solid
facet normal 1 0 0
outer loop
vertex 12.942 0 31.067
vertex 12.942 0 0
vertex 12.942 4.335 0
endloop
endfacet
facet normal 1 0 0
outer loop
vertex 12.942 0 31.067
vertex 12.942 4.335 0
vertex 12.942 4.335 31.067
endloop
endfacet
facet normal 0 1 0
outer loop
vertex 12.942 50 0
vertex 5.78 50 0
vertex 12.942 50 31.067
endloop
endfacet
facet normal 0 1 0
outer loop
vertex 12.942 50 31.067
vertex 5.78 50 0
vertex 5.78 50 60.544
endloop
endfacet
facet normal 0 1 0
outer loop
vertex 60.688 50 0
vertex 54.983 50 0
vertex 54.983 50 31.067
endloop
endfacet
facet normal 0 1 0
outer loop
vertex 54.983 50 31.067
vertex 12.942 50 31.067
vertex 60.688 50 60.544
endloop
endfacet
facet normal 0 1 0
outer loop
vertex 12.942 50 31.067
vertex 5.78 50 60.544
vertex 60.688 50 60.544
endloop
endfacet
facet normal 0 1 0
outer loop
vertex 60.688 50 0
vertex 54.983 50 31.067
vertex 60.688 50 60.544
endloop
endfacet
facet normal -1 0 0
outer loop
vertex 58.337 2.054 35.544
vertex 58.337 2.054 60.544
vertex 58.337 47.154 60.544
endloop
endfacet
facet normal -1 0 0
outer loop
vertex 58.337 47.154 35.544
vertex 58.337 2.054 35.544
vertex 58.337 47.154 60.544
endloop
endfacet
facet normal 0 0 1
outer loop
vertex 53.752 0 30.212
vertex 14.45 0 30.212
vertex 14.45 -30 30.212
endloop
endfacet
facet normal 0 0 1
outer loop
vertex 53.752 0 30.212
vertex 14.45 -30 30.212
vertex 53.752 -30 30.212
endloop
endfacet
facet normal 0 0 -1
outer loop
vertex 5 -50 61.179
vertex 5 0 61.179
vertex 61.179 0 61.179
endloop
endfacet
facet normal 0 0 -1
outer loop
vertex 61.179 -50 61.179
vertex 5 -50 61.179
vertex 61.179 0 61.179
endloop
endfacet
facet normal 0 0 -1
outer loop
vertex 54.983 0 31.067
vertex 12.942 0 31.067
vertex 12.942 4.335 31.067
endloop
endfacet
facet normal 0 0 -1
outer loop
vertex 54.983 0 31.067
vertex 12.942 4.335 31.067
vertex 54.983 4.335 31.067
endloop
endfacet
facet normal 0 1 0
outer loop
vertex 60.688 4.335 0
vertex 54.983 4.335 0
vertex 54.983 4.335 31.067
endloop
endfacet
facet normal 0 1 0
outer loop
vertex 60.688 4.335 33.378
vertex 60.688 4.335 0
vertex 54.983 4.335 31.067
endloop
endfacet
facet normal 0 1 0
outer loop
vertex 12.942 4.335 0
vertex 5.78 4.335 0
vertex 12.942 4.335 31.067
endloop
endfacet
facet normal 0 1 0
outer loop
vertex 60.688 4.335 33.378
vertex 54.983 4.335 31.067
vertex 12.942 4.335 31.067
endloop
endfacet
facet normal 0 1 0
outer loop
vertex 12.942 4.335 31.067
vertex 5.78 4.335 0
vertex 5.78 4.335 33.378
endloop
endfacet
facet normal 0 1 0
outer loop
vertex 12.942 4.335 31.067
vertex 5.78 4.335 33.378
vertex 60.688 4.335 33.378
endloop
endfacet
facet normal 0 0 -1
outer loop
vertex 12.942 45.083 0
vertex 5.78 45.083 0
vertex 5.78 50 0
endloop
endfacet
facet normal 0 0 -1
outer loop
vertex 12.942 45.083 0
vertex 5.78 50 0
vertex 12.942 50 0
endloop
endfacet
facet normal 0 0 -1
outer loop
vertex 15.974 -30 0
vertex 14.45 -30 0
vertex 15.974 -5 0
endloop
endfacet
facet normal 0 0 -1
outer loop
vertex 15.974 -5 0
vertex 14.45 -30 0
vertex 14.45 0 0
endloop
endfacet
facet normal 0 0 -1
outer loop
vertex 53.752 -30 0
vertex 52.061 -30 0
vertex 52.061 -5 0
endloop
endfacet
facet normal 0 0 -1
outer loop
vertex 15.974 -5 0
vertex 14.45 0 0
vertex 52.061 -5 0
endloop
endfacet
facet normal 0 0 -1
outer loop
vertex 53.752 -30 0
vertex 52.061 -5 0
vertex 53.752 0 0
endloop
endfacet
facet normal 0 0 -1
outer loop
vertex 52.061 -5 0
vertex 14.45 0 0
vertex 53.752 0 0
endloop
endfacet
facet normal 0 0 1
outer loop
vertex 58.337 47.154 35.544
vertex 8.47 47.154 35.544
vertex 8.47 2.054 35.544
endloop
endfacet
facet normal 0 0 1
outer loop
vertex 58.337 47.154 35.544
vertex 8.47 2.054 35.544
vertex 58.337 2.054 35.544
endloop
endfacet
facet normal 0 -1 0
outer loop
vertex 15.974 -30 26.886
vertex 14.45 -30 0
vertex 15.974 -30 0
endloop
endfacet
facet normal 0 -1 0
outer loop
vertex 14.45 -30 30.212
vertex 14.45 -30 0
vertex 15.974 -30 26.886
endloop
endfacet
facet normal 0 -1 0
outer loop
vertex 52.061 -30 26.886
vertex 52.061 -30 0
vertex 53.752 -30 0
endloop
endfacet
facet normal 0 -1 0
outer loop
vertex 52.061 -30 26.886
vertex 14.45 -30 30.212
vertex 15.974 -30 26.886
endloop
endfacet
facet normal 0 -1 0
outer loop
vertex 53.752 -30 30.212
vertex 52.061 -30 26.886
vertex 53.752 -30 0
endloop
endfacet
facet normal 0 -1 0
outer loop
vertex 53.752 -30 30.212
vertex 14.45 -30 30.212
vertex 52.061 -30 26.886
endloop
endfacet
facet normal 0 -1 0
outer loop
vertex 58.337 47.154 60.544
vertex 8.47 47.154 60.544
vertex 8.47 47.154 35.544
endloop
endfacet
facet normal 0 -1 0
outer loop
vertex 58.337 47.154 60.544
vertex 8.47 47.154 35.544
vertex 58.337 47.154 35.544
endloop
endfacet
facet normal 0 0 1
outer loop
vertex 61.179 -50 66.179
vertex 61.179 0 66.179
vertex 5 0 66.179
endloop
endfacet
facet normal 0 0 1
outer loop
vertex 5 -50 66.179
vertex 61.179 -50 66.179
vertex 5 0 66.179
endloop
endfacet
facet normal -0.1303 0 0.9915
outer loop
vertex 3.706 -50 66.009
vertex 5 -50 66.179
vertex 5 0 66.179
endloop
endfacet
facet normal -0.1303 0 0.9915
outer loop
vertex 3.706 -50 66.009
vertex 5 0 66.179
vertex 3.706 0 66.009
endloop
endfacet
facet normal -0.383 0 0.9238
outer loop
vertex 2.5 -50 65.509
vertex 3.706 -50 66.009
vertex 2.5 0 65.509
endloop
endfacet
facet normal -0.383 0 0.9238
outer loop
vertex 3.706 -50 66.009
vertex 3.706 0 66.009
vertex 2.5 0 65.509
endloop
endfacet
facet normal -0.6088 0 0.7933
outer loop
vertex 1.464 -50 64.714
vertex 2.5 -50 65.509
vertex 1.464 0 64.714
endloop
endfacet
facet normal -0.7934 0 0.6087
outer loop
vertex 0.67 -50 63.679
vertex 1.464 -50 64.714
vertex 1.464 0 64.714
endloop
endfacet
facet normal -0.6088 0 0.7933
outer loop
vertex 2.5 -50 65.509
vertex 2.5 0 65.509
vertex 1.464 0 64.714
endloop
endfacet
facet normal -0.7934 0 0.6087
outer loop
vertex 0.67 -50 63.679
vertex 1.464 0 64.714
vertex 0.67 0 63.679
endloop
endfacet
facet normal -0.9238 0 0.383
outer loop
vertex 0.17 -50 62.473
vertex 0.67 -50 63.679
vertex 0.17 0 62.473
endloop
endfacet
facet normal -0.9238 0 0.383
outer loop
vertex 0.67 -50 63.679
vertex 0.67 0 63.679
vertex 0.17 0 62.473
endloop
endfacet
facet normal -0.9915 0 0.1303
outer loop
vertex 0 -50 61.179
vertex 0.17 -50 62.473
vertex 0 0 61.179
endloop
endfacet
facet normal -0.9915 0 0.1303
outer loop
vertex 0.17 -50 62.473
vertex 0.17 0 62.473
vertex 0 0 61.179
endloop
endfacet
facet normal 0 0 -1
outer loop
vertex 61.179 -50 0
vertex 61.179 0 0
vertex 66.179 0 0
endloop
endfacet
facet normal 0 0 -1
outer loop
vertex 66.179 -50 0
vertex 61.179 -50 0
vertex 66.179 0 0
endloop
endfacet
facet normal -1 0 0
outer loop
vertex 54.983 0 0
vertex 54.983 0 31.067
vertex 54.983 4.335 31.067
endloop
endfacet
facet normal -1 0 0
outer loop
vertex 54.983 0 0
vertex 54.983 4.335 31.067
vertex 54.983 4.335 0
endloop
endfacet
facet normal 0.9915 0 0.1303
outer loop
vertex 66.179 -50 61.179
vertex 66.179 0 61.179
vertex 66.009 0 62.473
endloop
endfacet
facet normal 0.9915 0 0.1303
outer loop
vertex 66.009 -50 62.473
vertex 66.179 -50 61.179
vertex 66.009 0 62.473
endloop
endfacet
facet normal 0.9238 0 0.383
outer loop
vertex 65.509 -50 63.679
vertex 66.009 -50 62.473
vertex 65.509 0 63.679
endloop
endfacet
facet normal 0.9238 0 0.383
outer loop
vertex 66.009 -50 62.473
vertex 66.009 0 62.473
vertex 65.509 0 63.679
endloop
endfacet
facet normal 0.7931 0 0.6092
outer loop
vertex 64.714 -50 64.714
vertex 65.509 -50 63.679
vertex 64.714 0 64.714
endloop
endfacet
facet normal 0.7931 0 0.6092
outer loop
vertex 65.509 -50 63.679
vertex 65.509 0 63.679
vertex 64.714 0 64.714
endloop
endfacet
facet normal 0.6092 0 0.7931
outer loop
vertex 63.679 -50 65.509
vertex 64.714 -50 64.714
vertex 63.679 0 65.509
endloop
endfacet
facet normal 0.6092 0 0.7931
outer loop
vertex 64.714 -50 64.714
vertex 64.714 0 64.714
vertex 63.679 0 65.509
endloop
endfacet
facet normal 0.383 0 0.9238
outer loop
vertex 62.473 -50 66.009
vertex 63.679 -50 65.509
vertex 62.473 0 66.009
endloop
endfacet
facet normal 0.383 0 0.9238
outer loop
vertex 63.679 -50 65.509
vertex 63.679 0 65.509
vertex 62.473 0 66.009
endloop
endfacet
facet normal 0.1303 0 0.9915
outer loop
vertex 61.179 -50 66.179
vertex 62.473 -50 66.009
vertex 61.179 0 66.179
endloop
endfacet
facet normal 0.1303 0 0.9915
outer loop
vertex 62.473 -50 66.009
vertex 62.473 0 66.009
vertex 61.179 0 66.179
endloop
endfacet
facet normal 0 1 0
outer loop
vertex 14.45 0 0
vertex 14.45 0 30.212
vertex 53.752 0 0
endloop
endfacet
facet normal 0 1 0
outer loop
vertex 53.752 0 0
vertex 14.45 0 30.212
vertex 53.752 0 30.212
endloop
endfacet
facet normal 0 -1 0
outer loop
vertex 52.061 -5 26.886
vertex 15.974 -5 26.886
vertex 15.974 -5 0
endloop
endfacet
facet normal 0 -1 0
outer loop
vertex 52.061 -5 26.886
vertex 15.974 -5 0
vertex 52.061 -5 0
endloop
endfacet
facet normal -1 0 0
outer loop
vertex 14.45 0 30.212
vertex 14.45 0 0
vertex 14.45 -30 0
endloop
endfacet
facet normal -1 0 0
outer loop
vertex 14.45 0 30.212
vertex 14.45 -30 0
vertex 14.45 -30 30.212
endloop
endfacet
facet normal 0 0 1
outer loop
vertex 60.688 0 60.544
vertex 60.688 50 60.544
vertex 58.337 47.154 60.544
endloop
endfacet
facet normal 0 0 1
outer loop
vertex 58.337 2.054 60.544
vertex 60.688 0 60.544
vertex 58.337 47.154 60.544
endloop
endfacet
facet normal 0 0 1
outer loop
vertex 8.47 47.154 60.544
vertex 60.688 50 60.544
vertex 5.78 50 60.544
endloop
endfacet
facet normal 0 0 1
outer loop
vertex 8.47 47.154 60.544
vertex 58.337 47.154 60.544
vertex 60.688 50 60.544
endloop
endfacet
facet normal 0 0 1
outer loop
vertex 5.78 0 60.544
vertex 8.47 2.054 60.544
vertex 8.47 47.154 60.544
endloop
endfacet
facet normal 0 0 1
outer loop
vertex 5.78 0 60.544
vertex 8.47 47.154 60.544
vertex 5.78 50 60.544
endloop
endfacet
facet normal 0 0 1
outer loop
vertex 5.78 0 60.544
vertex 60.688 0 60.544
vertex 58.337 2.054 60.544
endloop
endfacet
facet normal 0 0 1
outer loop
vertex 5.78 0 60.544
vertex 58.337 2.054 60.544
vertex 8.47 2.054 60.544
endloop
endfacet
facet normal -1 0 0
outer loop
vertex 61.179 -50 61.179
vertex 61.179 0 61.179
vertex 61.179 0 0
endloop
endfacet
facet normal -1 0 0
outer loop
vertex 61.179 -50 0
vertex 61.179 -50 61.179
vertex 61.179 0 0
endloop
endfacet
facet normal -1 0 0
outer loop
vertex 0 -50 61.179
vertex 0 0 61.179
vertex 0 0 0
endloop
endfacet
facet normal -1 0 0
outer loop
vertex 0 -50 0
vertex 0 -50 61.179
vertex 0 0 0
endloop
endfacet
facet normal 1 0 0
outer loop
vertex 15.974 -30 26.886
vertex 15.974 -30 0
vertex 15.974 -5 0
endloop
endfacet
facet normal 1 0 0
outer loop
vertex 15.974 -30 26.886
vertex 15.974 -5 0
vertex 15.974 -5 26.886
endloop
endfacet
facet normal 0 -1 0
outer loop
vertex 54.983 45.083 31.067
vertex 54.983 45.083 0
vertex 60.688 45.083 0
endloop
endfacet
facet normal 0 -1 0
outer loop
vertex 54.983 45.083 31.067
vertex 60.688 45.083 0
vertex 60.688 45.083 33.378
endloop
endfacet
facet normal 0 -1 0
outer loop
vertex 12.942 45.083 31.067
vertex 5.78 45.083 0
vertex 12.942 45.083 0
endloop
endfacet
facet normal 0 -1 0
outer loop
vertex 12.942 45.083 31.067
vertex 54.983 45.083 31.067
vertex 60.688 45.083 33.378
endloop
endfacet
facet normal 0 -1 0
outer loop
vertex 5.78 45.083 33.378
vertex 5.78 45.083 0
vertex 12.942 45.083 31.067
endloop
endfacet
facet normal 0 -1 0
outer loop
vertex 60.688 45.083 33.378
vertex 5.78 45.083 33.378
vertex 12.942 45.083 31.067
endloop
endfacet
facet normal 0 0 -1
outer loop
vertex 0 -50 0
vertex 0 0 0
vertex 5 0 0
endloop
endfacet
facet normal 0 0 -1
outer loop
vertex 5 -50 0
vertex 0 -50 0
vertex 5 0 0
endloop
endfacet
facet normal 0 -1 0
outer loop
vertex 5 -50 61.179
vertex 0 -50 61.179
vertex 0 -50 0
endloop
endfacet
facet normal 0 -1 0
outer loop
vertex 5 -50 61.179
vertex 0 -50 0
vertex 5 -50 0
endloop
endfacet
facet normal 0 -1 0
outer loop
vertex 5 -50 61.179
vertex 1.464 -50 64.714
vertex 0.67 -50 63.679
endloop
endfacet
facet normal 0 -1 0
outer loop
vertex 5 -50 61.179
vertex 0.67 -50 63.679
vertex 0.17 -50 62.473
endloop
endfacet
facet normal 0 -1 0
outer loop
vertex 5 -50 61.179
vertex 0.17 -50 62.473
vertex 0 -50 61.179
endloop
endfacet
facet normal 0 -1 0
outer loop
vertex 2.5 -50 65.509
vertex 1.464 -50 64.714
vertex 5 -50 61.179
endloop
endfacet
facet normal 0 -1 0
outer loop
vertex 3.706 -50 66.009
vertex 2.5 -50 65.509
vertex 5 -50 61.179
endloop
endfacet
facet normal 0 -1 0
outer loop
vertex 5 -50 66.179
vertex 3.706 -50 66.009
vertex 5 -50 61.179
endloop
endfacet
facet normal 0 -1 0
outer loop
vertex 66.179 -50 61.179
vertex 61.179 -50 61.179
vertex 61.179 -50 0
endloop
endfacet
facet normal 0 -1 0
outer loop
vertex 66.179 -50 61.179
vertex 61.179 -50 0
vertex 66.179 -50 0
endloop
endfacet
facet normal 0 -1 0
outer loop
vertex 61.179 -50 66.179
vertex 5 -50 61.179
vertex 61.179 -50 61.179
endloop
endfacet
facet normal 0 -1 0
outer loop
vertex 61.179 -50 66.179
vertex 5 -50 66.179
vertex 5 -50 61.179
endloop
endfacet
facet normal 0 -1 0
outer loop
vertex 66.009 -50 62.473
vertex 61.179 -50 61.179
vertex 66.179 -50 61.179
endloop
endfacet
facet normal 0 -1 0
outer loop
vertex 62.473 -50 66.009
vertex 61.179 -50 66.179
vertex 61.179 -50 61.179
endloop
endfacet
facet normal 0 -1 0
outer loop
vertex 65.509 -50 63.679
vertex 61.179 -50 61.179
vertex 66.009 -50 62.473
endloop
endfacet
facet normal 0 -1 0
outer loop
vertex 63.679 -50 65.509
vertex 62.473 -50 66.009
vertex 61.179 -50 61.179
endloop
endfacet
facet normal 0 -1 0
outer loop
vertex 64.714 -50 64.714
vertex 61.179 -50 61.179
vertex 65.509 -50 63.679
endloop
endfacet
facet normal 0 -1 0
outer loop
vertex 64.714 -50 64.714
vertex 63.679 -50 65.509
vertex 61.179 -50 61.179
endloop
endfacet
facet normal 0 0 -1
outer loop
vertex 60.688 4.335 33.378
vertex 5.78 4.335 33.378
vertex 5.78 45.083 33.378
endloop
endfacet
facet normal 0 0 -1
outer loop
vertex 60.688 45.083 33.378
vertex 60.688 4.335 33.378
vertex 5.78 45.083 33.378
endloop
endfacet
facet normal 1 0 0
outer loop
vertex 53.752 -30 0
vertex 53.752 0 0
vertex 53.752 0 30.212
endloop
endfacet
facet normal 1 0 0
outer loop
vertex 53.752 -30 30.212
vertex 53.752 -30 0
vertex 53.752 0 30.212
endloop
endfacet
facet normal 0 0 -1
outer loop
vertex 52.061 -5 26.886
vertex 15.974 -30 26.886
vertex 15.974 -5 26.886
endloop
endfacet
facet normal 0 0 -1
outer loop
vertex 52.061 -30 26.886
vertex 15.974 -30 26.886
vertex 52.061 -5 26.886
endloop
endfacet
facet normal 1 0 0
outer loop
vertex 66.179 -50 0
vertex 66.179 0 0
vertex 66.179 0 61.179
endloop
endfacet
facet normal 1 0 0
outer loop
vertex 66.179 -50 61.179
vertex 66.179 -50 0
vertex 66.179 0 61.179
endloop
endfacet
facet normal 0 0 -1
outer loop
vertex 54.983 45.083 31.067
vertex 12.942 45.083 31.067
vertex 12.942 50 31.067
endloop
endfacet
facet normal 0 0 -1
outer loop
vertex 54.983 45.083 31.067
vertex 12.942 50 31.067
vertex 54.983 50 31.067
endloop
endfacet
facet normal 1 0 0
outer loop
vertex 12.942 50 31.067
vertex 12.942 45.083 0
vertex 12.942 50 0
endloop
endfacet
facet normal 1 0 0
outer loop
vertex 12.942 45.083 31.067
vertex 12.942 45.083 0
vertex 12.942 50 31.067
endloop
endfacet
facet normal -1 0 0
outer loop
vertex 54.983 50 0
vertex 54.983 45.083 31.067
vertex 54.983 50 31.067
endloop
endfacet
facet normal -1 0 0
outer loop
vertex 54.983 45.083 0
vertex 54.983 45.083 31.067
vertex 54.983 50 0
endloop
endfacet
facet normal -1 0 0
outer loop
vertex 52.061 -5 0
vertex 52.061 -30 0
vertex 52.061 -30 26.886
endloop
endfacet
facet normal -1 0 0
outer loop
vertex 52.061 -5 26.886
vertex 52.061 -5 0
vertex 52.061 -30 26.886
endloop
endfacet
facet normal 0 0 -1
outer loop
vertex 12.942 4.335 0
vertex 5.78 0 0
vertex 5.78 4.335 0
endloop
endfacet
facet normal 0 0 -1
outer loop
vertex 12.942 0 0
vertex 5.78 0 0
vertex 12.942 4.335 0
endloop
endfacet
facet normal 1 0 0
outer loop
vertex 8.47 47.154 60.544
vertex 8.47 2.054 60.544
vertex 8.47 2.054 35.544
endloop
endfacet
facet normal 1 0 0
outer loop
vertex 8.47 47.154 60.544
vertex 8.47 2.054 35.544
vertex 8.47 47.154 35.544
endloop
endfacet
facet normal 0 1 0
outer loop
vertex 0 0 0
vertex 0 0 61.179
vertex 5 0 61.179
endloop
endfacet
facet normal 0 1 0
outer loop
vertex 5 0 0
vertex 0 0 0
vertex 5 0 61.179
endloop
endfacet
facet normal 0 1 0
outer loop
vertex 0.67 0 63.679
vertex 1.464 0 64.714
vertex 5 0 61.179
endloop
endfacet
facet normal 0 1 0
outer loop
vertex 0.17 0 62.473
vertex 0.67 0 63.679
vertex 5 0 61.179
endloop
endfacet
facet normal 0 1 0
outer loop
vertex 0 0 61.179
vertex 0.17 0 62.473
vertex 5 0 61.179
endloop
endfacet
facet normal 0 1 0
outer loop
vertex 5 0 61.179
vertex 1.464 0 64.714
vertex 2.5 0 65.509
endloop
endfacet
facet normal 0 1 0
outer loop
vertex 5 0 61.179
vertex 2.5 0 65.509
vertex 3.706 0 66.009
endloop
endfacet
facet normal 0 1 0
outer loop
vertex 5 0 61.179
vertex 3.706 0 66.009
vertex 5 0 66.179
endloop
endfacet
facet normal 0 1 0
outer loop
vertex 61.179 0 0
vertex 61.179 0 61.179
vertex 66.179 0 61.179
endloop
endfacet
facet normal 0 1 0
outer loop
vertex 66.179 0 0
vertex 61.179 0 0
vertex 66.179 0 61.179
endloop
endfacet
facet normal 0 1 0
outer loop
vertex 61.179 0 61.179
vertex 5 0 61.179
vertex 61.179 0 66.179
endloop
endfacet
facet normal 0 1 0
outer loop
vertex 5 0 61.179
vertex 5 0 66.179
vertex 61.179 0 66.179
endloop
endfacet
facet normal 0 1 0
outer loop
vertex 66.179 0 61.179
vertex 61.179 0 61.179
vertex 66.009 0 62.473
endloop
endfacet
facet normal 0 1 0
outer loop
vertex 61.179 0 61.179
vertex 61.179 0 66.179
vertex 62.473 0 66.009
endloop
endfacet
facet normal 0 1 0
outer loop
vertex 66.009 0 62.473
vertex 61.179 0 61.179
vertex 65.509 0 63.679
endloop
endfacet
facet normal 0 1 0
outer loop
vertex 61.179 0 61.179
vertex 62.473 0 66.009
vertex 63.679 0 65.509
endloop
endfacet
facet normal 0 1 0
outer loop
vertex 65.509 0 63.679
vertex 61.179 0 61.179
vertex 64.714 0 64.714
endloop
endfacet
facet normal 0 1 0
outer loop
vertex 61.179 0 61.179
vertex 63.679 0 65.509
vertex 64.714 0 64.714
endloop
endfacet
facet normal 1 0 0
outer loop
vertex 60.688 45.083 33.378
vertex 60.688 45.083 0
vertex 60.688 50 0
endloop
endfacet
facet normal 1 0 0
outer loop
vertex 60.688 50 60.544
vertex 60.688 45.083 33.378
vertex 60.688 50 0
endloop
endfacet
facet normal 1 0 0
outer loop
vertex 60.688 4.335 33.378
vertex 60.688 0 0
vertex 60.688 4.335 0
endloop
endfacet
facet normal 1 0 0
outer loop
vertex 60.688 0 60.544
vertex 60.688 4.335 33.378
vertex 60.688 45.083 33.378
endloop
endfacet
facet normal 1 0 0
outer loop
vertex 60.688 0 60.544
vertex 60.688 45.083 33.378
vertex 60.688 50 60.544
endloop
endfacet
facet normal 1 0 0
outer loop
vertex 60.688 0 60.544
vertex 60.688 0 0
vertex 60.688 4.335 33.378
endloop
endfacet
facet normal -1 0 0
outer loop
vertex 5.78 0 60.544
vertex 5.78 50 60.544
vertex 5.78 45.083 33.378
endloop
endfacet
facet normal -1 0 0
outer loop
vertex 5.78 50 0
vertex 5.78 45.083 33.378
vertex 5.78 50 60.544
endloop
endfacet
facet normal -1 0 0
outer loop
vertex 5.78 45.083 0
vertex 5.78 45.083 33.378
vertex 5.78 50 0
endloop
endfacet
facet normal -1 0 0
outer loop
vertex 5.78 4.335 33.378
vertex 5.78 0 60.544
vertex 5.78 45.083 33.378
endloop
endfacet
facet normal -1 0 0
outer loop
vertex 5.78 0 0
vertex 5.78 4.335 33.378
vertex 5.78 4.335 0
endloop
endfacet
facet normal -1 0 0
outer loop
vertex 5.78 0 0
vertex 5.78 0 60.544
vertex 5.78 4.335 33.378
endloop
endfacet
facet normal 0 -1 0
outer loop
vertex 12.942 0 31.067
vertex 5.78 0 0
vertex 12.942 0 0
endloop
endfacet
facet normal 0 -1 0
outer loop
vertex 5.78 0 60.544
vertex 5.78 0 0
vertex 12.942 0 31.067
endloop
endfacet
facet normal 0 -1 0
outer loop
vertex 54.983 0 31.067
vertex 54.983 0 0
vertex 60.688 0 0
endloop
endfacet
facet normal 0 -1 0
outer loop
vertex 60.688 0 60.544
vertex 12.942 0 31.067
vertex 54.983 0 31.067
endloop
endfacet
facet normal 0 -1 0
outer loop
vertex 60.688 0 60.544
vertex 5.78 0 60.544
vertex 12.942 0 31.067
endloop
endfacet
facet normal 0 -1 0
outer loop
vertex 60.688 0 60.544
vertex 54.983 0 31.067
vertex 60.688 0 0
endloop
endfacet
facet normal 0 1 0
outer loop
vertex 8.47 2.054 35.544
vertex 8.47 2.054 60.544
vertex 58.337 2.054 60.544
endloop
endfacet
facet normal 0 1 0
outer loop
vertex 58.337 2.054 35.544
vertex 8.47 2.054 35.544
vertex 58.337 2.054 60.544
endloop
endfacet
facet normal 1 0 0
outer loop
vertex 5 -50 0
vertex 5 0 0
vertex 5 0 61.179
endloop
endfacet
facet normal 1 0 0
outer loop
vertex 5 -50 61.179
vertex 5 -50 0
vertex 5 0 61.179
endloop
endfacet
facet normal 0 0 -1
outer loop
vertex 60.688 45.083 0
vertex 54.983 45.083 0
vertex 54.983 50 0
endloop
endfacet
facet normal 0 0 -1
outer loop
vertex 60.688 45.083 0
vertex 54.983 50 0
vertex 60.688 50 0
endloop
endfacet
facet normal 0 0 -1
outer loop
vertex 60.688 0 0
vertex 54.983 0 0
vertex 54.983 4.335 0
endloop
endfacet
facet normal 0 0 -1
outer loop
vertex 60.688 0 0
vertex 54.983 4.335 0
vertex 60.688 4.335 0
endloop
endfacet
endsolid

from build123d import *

# Parameters (mm, degrees)
F2_DEPTH  = 50
F3_DEPTH  = 50
F4_W      = 40.7477049157
F4_H      = 33.3784408867
F5_DEPTH  = 90
F1_W      = 39.302748628
F1_H      = 30.2119846428
F6_DEPTH  = 30
F7_W      = 49.8667024076
F7_H      = 45.1001813635
F8_DEPTH  = 25
F9_W      = 36.0871851444
F9_H      = 26.8858615309
F10_DEPTH = 25


with BuildPart() as f2:
    # F0 (on Front) → F2 (new body)
    with BuildSketch(Plane.XZ):
        with BuildLine():
            Line((0, 61.1789029837), (0, 0))
            Line((0, 0), (5, 0))
            Line((5, 0), (5, 61.1789029837))
            Line((5, 61.1789029837), (61.1789029837, 61.1789029837))
            Line((61.1789029837, 61.1789029837), (61.1789029837, 0))
            Line((61.1789029837, 0), (66.1789029837, 0))
            Line((66.1789029837, 0), (66.1789029837, 61.1789029837))
            ThreePointArc((66.1789029837, 61.1789029837), (64.7144368896, 64.7144368896), (61.1789029837, 66.1789029837))
            Line((61.1789029837, 66.1789029837), (5, 66.1789029837))
            ThreePointArc((5, 66.1789029837), (1.4644660941, 64.7144368896), (0, 61.1789029837))
        make_face()
    extrude(amount=F2_DEPTH)


with BuildPart() as f3:
    # F1 (on Front) → F3 (new body)
    with BuildSketch(Plane.XZ):
        Polygon((60.6880784035, 60.5435818434), (5.7798172347, 60.5435818434), (5.7798172347, 31.0665164143), (5.7798172347, 0), (12.9421753809, 0), (12.9421753809, 31.0665164143), (54.9831390381, 31.0665164143), (54.9831390381, 0), (60.6880784035, 0), (60.6880784035, 31.0665164143), align=None)
    extrude(amount=-F3_DEPTH)

    # F4 (on Right) → F5 (cut)
    with BuildSketch(Plane.YZ):
        with Locations((24.7087166645, 16.6892204434)):
            Rectangle(F4_W, F4_H)
    extrude(amount=F5_DEPTH, mode=Mode.SUBTRACT)

    # F7 (on face) → F8 (cut)
    with BuildSketch(Plane.XY.offset(60.5435818434)):
        with Locations((33.4032569081, 24.6041868813)):
            Rectangle(F7_W, F7_H)
    extrude(amount=-F8_DEPTH, mode=Mode.SUBTRACT)


with BuildPart() as f6:
    # F1 (on Front) → F6 (new body)
    with BuildSketch(Plane.XZ):
        with Locations((34.1009176336, 15.1059923214)):
            Rectangle(F1_W, F1_H)
    extrude(amount=F6_DEPTH)

    # F9 (on face) → F10 (cut)
    with BuildSketch(Plane.XZ.offset(30)):
        with Locations((34.0172573924, 13.4429307655)):
            Rectangle(F9_W, F9_H)
    extrude(amount=-F10_DEPTH, mode=Mode.SUBTRACT)


solid = Compound([f2.part, f3.part, f6.part])
